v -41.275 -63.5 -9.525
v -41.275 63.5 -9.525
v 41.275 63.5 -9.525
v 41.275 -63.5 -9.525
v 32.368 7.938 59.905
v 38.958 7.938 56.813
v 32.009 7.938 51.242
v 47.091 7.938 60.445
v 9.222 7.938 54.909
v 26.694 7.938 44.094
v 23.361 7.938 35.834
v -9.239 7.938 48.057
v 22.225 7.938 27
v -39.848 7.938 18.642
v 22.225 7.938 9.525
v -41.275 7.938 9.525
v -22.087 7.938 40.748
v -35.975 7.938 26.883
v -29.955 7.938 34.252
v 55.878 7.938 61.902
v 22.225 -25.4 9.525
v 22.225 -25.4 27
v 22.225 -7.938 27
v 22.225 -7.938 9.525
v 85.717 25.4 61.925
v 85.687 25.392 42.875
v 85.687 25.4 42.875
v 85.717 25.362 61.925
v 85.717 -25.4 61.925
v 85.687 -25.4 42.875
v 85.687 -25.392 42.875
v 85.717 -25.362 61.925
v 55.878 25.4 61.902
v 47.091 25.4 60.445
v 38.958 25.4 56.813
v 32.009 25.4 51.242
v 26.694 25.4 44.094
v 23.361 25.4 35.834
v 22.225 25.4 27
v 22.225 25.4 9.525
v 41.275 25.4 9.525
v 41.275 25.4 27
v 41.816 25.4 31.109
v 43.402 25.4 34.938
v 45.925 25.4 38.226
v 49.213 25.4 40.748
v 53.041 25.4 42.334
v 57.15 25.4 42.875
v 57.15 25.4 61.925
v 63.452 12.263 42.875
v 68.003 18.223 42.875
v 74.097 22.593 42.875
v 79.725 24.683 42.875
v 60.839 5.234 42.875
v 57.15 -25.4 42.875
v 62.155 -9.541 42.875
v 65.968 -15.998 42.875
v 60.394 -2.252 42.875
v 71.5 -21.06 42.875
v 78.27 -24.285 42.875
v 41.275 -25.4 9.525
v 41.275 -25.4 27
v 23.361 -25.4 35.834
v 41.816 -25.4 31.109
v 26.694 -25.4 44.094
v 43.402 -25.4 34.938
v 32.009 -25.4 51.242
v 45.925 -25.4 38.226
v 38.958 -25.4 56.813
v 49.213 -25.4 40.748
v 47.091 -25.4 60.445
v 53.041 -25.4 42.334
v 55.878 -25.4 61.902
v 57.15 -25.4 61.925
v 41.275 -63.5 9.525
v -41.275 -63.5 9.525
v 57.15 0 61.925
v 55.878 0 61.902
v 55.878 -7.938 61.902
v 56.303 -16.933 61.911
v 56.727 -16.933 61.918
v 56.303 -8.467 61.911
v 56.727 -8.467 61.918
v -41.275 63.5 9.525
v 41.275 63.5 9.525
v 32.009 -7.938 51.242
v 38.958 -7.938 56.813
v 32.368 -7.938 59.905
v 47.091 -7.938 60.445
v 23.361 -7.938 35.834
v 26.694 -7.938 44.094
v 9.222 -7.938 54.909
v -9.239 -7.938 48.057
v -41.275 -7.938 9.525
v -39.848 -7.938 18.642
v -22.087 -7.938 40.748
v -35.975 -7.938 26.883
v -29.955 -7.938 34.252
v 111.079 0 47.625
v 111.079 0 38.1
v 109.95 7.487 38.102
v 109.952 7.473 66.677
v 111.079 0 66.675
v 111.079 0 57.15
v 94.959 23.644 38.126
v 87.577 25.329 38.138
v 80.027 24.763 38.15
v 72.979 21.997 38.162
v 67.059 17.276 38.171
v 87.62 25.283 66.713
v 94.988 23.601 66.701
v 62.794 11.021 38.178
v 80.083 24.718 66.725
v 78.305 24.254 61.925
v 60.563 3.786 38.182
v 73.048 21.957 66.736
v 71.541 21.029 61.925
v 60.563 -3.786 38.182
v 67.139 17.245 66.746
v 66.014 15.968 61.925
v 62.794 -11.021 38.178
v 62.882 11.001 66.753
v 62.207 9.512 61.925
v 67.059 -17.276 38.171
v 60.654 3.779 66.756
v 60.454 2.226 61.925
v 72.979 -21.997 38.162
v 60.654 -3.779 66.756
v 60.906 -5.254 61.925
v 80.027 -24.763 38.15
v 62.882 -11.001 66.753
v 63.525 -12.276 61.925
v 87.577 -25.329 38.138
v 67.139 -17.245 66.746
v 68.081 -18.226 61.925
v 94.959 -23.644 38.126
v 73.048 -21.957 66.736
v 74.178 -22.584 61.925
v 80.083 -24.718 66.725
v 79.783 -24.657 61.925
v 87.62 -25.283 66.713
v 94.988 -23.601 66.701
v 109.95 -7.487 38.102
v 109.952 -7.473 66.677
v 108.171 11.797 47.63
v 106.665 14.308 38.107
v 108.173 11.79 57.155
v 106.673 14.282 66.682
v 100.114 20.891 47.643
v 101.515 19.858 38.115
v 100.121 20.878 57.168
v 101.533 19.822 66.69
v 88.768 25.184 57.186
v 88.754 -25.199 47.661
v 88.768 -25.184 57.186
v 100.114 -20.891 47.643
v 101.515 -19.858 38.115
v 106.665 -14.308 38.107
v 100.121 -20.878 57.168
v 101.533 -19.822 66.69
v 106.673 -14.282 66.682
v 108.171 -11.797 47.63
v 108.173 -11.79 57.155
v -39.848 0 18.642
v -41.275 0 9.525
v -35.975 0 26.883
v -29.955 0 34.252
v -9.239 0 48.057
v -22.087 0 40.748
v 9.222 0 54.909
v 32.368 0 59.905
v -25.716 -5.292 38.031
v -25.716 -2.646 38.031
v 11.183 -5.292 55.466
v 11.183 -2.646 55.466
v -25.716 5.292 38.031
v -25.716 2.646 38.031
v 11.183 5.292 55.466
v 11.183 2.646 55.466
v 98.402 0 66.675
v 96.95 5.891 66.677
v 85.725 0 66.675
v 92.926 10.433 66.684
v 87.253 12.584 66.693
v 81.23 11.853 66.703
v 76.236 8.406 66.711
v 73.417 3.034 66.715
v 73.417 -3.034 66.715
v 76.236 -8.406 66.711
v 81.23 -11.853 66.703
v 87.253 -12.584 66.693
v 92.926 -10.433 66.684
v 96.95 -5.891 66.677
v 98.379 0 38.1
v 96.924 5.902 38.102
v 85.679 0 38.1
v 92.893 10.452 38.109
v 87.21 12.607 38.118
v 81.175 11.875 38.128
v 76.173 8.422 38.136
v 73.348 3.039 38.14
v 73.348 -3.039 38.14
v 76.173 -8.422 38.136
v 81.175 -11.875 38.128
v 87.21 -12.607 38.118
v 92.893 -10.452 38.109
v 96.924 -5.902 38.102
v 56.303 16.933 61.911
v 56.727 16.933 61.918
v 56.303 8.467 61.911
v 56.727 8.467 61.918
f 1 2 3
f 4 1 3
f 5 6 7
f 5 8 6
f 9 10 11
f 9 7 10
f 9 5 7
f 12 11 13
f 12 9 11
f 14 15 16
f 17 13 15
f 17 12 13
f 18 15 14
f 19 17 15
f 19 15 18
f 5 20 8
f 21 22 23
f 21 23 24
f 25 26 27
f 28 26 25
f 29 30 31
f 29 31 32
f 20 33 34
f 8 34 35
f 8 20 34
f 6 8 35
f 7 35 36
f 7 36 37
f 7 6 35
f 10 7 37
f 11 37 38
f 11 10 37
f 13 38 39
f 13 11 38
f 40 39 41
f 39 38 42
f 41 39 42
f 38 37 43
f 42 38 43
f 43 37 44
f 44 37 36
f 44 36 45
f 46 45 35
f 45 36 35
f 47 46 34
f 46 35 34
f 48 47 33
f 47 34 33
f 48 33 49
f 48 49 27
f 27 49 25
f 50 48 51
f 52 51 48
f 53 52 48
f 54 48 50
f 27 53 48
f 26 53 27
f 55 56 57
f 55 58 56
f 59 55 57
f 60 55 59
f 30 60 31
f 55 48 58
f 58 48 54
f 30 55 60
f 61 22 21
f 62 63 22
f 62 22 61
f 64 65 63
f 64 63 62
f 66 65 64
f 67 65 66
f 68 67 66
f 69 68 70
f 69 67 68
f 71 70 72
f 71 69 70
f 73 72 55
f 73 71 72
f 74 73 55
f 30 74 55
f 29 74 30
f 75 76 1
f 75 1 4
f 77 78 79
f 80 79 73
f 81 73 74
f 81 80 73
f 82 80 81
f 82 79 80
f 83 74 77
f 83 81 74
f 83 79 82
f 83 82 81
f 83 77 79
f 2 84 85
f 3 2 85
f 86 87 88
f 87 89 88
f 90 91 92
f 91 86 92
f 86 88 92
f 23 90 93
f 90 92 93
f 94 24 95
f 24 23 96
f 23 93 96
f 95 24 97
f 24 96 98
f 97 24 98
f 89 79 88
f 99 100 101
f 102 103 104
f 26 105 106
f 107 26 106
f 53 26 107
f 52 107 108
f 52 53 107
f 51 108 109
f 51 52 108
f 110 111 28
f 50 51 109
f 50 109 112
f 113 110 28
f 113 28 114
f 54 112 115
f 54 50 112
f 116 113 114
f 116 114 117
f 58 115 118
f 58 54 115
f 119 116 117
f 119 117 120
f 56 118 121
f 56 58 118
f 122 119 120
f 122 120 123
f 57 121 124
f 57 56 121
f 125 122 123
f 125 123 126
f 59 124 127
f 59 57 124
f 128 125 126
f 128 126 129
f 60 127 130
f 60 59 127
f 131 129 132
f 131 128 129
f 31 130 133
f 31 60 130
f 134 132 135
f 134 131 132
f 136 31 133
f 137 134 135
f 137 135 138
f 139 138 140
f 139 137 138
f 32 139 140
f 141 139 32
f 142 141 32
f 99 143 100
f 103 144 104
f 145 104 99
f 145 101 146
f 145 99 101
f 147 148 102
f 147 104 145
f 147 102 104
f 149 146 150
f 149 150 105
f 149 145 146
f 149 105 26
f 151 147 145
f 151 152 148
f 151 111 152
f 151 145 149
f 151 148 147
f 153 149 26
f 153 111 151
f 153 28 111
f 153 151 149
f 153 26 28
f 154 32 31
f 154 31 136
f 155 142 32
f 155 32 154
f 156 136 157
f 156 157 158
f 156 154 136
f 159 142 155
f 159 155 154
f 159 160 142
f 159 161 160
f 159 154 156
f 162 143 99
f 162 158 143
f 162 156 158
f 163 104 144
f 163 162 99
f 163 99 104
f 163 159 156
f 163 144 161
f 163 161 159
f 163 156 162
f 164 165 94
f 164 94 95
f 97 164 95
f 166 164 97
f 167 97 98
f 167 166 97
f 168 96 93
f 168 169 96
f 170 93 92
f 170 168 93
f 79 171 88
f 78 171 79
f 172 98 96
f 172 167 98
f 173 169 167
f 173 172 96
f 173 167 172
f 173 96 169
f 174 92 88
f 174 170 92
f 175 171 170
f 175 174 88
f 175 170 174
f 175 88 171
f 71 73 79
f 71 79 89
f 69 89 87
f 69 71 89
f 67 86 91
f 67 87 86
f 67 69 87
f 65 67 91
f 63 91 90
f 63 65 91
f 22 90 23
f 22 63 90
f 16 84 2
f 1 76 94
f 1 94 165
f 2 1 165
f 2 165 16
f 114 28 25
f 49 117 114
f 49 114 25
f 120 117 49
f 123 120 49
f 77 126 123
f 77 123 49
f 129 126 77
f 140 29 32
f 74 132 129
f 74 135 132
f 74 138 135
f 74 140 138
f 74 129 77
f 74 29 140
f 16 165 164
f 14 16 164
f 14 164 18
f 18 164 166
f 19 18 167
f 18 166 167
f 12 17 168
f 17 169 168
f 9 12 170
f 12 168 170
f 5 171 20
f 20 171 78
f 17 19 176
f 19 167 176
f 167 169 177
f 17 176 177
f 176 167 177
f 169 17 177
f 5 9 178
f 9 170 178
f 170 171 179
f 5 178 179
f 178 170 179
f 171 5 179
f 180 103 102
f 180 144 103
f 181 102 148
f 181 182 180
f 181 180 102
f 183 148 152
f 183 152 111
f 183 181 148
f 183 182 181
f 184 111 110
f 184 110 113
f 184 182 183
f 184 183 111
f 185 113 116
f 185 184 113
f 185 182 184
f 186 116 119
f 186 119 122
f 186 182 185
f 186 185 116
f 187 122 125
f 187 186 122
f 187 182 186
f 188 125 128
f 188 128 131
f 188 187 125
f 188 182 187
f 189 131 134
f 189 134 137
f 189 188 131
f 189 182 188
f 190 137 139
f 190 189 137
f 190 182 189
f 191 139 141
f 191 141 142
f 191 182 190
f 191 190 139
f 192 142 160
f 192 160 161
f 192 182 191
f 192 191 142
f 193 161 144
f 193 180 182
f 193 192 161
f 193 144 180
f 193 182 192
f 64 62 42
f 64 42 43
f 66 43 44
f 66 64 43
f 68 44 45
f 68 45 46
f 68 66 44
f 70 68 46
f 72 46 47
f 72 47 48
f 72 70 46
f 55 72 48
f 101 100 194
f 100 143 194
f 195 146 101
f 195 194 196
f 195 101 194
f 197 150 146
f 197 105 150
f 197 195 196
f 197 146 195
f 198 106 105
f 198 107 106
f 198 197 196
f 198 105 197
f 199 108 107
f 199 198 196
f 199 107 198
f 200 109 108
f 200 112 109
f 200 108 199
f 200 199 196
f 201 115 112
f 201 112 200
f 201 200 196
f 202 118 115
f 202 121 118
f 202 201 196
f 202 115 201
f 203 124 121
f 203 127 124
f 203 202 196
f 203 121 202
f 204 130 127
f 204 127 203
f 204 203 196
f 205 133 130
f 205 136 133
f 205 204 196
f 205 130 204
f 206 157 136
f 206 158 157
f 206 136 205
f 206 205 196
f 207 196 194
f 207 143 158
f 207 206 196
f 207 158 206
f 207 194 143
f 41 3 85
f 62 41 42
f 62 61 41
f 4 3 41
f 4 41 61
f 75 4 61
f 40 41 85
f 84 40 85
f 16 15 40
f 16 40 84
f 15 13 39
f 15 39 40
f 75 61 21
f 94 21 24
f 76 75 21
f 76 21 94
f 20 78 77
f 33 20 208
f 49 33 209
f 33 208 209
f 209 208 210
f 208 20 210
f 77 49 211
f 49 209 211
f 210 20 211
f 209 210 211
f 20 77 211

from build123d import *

# Parameters (mm, degrees)
F1_DEPTH = 63.5
F2_DEPTH = 25.4
F3_DEPTH = 7.9375


with BuildPart() as f1:
    # F0 (on Front) → F1 (new body, symmetric)
    with BuildSketch(Plane.XZ):
        Polygon((22.225, 9.525), (-41.275, 9.525), (-41.275, -9.525), (41.275, -9.525), (41.275, 9.525), align=None)
    extrude(amount=F1_DEPTH, both=True)

    # F0 (on Front) → F2 (join, symmetric)
    with BuildSketch(Plane.XZ):
        with BuildLine():
            Line((22.225, 27.0002), (22.225, 9.525))
            Line((22.225, 9.525), (41.275, 9.525))
            Line((41.275, 9.525), (41.275, 27.0002))
            ThreePointArc((41.275, 27.0002), (45.9246798487, 38.2255201513), (57.15, 42.8752))
            Line((57.15, 42.8752), (60.2788307428, 42.8752))
            Line((60.2788307428, 42.8752), (60.2788307428, 61.9252))
            Line((60.2788307428, 61.9252), (57.15, 61.9252))
            add(Edge.make_bspline(
                [(55.8781690604, 61.9020347807), (56.3029319207, 61.9112789405), (56.7268937511, 61.919000586), (57.15, 61.9252)],
                knots=[110.4402466435, 110.4402466435, 110.4402466435, 110.4402466435, 111.5045361635, 111.5045361635, 111.5045361635, 111.5045361635], degree=3))
            ThreePointArc((55.8781690604, 61.9020347807), (32.0086563549, 51.2420741998), (22.225, 27.0002))
        make_face()
        Polygon((85.7173256435, 61.9252), (60.2788307428, 61.9252), (60.2788307428, 42.8752), (85.6865461387, 42.8752), align=None)
    extrude(amount=F2_DEPTH, both=True)

    # F0 (on Front) → F3 (join, symmetric)
    with BuildSketch(Plane.XZ):
        with BuildLine():
            add(Edge.make_bspline(
                [(-41.275, 9.525), (-40.9017486409, 43.5890820487), (11.8009568178, 60.94277767), (55.8781690604, 61.9020347807)],
                knots=[0, 0, 0, 0, 110.4402466435, 110.4402466435, 110.4402466435, 110.4402466435], degree=3))
            Line((-41.275, 9.525), (22.225, 9.525))
            Line((22.225, 9.525), (22.225, 27.0002))
            ThreePointArc((22.225, 27.0002), (32.0086563549, 51.2420741998), (55.8781690604, 61.9020347807))
        make_face()
    extrude(amount=F3_DEPTH, both=True)

    # F0 (on Front) → F4 (revolve)
    with BuildSketch(Plane.XZ):
        Polygon((85.725, 66.675), (85.7173256435, 61.9252), (85.6865461387, 42.8752), (85.6788307428, 38.1), (111.0788307428, 38.1), (111.0788307428, 66.675), align=None)
    revolve(axis=Axis((85.7019153714, 0, 52.3875), (0.0016157199, 0, 0.9999986947)))


solid = f1.part
